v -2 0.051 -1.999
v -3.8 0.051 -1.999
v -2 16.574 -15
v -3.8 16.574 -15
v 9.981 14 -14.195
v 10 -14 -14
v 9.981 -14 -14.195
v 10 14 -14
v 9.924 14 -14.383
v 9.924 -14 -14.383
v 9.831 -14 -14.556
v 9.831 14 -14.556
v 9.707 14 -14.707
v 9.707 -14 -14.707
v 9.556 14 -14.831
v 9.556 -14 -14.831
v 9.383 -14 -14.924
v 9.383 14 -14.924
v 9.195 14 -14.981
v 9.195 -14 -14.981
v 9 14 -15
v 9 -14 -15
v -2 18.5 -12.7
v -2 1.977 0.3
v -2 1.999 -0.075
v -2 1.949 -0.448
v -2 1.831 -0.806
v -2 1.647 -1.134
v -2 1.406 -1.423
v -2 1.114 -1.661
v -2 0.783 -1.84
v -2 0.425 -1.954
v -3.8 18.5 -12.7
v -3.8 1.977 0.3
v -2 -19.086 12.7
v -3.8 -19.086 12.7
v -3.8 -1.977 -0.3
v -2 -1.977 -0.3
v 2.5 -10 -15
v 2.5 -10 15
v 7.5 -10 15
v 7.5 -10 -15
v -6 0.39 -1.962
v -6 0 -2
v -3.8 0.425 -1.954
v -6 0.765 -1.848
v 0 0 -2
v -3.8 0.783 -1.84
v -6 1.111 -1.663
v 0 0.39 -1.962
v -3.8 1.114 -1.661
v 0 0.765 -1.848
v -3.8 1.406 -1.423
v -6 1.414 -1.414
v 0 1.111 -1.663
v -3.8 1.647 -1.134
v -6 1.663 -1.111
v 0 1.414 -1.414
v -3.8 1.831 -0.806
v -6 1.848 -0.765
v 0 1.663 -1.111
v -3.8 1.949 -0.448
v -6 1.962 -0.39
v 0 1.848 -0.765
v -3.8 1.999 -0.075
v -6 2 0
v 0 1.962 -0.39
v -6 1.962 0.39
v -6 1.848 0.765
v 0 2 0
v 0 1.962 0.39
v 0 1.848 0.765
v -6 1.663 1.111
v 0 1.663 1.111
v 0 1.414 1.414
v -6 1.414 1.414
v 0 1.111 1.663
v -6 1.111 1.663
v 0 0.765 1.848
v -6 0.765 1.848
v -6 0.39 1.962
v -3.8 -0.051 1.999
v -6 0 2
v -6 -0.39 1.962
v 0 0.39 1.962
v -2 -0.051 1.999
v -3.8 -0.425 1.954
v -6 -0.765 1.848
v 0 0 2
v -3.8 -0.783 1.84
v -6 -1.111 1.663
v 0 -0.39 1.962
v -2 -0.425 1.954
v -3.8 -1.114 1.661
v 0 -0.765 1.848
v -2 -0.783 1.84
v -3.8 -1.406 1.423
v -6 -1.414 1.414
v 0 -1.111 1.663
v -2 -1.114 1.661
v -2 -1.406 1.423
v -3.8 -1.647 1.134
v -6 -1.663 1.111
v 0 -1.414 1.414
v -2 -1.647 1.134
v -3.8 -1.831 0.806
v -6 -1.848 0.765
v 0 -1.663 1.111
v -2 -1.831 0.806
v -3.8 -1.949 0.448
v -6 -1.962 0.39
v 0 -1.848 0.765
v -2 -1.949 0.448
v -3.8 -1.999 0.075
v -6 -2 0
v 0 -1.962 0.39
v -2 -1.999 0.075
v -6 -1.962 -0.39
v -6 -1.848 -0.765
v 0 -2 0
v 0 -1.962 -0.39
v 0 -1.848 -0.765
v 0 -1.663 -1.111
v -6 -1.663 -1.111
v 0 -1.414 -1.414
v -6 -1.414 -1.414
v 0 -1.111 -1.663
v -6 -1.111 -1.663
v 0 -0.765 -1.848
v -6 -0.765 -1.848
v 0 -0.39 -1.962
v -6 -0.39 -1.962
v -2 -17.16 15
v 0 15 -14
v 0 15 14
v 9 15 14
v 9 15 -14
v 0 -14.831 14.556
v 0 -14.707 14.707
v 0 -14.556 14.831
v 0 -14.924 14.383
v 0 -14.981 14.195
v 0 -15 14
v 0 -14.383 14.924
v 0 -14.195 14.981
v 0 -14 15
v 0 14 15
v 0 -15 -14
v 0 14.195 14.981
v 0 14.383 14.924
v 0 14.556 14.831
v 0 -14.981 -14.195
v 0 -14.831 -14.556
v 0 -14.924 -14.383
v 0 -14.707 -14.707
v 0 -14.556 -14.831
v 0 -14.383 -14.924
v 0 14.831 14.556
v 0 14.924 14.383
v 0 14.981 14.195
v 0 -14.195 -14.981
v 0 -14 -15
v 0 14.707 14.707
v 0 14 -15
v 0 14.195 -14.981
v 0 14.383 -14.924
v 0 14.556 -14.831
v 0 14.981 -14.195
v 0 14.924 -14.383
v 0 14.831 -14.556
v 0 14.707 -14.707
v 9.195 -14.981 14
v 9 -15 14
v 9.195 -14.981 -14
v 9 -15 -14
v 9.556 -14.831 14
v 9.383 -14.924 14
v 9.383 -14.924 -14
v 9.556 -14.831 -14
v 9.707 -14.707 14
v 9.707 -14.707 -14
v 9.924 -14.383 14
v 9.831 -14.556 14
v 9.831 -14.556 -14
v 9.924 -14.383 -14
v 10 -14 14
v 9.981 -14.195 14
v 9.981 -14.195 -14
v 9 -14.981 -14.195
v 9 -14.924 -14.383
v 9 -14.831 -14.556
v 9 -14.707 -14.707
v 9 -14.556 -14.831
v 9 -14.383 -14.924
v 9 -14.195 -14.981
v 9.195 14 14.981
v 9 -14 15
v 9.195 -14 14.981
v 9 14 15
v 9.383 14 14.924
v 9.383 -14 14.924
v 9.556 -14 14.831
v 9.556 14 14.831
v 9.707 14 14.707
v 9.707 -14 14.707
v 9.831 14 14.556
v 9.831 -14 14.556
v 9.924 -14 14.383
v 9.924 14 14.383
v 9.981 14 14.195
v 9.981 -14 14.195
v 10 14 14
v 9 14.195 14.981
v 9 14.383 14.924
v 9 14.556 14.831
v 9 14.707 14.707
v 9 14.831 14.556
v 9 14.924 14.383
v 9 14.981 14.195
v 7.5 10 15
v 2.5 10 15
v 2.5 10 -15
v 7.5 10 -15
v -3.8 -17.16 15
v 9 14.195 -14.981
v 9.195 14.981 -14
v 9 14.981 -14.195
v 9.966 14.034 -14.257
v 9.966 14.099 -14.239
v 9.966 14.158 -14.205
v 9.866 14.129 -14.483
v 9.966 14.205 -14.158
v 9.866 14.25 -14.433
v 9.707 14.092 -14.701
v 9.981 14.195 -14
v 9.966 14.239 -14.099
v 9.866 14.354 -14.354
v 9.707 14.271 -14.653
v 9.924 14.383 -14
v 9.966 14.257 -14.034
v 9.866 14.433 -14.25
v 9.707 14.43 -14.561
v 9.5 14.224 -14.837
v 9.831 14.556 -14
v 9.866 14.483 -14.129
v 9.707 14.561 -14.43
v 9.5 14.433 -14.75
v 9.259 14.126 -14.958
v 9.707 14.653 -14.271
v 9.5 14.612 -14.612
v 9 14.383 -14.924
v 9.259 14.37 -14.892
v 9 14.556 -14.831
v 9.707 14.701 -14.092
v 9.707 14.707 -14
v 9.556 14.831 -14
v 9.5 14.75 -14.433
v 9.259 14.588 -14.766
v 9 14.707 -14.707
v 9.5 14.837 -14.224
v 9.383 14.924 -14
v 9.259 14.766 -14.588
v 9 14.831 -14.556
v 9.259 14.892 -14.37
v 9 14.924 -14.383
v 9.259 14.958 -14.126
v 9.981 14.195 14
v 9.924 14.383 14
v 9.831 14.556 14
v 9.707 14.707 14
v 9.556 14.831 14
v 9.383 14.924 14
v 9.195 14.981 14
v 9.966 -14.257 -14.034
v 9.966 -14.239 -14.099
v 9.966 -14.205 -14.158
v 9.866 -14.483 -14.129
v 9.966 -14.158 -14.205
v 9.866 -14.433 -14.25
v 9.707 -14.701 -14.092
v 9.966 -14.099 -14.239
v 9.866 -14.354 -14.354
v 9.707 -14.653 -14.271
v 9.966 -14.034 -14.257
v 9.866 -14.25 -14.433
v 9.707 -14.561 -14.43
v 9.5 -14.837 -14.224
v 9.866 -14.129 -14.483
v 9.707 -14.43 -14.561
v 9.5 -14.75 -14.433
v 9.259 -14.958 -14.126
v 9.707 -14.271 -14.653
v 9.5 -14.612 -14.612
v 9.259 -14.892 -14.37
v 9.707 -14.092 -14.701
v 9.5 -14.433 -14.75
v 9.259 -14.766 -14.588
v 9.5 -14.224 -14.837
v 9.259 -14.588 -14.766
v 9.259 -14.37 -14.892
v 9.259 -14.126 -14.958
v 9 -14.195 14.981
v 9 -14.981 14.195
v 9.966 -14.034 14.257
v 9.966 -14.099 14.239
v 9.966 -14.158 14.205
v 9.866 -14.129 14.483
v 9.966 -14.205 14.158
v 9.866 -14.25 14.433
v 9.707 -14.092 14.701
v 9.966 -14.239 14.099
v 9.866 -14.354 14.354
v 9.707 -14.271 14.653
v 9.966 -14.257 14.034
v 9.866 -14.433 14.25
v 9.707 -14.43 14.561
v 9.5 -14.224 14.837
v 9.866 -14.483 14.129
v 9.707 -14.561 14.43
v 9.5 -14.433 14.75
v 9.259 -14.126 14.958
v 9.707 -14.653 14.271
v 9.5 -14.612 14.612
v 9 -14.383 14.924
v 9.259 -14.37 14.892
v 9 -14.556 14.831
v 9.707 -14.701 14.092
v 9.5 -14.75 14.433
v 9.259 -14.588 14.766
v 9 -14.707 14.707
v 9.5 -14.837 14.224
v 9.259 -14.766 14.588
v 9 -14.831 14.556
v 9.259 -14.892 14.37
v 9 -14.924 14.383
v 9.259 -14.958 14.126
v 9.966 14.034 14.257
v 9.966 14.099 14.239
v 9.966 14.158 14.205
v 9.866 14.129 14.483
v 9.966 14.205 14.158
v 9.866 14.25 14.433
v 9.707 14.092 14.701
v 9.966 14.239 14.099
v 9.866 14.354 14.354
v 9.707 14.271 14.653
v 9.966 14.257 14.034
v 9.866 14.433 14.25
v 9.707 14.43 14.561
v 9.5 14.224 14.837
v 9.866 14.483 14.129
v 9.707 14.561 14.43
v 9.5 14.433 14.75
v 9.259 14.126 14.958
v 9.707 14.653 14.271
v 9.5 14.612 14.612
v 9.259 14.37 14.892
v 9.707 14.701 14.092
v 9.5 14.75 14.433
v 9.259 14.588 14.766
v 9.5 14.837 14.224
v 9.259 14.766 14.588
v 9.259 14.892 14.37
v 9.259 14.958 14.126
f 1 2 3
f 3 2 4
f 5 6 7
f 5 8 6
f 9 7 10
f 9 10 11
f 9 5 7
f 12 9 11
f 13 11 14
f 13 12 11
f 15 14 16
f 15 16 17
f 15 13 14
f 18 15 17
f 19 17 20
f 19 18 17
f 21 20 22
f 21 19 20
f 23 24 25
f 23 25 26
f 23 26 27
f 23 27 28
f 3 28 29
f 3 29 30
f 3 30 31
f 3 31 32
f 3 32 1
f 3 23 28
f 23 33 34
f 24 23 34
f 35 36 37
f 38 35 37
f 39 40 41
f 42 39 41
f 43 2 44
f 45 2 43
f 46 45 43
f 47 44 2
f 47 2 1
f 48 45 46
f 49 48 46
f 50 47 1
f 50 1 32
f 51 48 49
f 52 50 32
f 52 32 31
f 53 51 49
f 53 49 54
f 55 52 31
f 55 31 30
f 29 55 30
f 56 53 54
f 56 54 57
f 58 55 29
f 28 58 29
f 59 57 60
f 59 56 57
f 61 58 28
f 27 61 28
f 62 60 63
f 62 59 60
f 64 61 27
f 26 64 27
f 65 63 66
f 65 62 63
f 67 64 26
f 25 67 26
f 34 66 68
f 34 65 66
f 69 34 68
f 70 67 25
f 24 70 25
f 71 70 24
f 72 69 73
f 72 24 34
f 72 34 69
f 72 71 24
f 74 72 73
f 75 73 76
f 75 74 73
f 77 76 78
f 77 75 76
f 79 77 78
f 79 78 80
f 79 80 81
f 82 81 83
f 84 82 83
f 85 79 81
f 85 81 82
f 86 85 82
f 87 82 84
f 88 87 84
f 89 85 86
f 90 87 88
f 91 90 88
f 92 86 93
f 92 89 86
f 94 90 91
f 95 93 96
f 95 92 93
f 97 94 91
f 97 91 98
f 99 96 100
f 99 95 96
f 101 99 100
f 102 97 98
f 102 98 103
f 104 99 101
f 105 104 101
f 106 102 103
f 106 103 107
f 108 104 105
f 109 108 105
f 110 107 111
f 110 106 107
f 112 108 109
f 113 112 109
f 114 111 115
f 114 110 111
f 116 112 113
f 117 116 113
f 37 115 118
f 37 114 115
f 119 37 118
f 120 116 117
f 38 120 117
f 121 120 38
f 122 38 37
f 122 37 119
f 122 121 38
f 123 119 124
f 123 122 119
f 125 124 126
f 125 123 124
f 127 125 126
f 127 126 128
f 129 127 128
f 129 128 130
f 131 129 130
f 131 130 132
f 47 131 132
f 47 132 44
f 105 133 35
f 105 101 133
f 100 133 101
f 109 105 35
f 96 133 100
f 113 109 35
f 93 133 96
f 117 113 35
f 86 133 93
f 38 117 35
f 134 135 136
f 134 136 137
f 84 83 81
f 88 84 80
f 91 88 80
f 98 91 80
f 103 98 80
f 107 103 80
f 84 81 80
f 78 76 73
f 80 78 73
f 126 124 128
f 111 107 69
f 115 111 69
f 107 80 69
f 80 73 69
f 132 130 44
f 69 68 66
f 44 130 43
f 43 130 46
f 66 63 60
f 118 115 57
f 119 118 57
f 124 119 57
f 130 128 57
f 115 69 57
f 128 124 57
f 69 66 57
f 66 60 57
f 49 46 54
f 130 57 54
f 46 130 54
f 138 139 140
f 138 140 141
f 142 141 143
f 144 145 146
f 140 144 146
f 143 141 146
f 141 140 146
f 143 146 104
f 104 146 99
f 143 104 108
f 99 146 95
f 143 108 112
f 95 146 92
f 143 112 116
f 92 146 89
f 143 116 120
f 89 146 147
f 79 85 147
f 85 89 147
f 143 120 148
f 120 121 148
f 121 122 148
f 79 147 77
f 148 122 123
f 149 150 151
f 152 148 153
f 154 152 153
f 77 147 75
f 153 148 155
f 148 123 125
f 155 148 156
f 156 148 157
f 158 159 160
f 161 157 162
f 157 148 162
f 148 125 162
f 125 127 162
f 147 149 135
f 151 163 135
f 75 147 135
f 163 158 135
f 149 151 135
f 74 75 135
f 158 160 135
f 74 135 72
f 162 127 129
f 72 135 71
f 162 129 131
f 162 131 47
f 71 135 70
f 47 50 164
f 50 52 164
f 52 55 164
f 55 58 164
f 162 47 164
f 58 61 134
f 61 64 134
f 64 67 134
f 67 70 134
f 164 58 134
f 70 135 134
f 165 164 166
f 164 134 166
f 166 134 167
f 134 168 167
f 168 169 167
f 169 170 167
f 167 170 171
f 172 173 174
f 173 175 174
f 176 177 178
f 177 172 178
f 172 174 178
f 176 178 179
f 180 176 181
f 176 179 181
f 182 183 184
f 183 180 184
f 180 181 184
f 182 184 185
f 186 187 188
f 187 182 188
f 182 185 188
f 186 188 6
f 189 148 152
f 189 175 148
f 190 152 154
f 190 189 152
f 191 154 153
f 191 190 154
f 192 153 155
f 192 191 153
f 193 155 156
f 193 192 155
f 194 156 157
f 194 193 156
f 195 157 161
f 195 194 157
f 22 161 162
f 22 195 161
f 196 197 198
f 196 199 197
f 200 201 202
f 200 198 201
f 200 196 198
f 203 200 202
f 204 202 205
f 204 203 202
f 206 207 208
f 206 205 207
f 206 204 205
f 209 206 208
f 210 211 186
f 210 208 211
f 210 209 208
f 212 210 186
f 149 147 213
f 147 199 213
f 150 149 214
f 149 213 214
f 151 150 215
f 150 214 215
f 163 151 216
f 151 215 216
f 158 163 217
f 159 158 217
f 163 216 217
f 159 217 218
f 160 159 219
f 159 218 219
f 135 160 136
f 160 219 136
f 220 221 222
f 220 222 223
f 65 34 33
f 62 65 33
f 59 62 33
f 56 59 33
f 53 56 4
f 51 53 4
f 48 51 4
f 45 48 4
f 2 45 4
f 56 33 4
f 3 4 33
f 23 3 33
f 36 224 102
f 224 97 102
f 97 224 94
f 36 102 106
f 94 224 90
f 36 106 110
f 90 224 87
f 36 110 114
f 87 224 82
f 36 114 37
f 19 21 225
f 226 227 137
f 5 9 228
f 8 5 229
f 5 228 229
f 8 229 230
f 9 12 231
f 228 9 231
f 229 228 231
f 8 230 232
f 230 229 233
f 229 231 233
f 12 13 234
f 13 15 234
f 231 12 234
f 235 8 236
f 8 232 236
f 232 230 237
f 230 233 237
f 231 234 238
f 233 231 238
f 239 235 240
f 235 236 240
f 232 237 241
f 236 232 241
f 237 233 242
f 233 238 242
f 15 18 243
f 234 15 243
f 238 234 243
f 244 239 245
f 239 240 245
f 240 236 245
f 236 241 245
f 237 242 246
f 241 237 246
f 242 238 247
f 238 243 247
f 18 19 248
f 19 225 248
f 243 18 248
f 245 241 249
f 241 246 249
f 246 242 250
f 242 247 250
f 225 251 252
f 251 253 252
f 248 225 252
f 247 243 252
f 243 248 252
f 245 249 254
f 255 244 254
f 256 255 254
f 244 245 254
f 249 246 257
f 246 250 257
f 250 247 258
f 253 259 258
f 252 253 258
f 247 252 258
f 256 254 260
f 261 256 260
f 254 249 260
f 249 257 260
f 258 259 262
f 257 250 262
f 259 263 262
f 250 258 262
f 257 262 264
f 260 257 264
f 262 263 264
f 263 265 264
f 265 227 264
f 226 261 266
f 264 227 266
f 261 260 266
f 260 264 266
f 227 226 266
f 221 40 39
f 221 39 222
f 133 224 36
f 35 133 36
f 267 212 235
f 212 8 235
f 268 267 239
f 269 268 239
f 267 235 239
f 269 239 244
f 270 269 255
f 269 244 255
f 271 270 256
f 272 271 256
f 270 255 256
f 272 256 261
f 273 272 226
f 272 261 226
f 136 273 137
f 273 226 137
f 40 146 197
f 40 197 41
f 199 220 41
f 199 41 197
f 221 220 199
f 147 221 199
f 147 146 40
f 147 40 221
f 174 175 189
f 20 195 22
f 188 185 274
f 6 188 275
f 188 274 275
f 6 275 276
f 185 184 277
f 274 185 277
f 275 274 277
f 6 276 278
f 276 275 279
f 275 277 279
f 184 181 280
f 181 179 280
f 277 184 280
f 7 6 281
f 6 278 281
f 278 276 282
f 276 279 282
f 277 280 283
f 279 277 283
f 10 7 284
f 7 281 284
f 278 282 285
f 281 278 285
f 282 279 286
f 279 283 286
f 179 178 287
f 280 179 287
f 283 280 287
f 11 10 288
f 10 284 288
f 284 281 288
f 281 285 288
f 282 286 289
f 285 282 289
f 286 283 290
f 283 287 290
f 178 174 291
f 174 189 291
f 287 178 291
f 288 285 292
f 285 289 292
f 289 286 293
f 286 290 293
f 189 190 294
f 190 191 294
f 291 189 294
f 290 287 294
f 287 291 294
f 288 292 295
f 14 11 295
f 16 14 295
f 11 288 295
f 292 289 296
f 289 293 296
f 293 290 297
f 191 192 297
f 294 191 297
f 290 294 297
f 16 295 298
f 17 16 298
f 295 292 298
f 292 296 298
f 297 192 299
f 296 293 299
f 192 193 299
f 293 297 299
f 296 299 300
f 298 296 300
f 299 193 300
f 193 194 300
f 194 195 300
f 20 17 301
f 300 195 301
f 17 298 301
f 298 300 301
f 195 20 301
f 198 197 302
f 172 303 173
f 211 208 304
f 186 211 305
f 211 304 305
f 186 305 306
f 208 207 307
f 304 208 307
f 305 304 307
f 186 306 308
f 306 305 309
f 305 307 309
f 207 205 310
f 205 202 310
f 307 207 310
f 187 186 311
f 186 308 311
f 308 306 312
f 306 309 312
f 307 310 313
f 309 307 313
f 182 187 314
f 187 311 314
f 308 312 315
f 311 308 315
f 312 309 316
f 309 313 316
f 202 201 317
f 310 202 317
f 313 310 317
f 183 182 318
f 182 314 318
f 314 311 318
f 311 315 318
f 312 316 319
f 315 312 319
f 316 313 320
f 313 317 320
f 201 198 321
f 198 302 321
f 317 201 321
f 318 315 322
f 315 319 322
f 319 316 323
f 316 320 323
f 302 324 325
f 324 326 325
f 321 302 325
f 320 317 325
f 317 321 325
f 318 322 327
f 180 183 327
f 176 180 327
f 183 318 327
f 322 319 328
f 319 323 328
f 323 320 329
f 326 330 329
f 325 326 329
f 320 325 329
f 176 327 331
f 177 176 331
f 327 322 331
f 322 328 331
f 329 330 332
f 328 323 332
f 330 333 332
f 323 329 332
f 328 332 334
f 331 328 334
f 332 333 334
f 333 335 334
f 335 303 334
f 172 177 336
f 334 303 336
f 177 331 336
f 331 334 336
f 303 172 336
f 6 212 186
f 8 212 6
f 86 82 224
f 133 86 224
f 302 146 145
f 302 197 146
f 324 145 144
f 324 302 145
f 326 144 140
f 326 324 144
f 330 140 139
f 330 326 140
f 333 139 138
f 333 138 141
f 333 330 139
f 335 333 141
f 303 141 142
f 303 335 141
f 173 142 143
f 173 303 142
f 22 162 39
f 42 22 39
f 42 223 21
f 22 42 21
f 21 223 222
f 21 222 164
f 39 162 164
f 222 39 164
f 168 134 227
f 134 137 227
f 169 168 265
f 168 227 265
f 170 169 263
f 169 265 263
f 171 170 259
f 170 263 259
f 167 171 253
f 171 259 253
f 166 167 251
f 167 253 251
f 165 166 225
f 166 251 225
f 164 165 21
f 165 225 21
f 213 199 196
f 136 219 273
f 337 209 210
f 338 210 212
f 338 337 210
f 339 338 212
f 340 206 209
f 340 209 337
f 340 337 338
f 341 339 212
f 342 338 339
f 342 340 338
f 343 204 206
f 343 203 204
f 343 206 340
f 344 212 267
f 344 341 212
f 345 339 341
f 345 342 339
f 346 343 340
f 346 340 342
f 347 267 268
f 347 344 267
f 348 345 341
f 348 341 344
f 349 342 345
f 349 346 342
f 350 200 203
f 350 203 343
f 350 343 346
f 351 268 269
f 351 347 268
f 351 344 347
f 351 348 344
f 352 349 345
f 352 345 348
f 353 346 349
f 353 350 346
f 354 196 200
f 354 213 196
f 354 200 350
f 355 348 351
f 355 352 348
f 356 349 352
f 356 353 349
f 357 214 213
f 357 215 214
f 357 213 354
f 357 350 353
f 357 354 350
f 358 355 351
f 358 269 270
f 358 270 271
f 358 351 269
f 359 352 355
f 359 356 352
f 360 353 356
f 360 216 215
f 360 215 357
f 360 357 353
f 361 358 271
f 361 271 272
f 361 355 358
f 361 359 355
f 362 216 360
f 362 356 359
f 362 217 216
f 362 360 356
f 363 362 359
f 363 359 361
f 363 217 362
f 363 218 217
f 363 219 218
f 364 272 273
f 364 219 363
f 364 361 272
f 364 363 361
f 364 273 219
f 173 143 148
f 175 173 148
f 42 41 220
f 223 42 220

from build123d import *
from build123d.topology import SkipClean

# Parameters (mm, degrees)
SKETCH_2_R          = 2
EXTRUDE_1_DEPTH     = 6
EXTRUDE_2_DEPTH     = 1.8
SKETCH_6_W          = 30
SKETCH_6_H          = 30
EXTRUDE_3_DEPTH     = 10
SKETCH_7_W          = 5
SKETCH_7_H          = 20
CUT_EXTRUDE_1_DEPTH = 37.936034472
FILLET_1_R          = 1


with BuildPart() as part:
    # Эскиз2 → Бобышка-Вытянуть1 (new body)
    with BuildSketch(Plane(origin=(0, 0, 0), x_dir=(0, 0, -1), z_dir=(1, 0, 0))):
        Circle(SKETCH_2_R)
    extrude(amount=-EXTRUDE_1_DEPTH)

    # Эскиз5 → Бобышка-Вытянуть2 (add)
    with SkipClean():  # the faces are left unmerged after this step: merging them gives an invalid solid
        with BuildSketch(Plane(origin=(-2, 0, 0), x_dir=(0, 0, -1), z_dir=(1, 0, 0))):
            with BuildLine():
                Line((12.700200279, 18.5), (-0.300448261, 1.977303933))
                ThreePointArc((-0.300448261, 1.977303933), (-1.533199814, 1.284250104), (-1.99935146, -0.050928777))
                Line((-1.99935146, -0.050928777), (-15, -17.159500316))
                Line((-15, -17.159500316), (-12.700200279, -19.085875472))
                Line((-12.700200279, -19.085875472), (0.300448261, -1.977303933))
                ThreePointArc((0.300448261, -1.977303933), (1.533199814, -1.284250104), (1.99935146, 0.050928777))
                Line((1.99935146, 0.050928777), (15, 16.573624844))
                Line((15, 16.573624844), (12.700200279, 18.5))
            make_face()
        extrude(amount=-EXTRUDE_2_DEPTH)

    # Эскиз6 → Бобышка-Вытянуть3 (add)
    with BuildSketch(Plane(origin=(0, 0, 0), x_dir=(0, 0, -1), z_dir=(1, 0, 0))):
        Rectangle(SKETCH_6_W, SKETCH_6_H)
    extrude(amount=EXTRUDE_3_DEPTH)

    # Эскиз7 → Вырез-Вытянуть1 (cut, through all)
    with BuildSketch(Plane.XY.offset(15)):
        with Locations((5, 0)):
            Rectangle(SKETCH_7_W, SKETCH_7_H)
    extrude(amount=-CUT_EXTRUDE_1_DEPTH, mode=Mode.SUBTRACT)

    # Скругление1
    fillet_1_edges = [part.edges().sort_by_distance(p)[0] for p in [
        (5, 15, 15),
        (5, 15, -15),
        (10, -15, 0),
        (5, -15, -15),
        (5, -15, 15),
        (10, 0, -15),
        (10, 0, 15),
        (10, 15, 0),
    ]]
    fillet(fillet_1_edges, radius=FILLET_1_R)


solid = part.part
